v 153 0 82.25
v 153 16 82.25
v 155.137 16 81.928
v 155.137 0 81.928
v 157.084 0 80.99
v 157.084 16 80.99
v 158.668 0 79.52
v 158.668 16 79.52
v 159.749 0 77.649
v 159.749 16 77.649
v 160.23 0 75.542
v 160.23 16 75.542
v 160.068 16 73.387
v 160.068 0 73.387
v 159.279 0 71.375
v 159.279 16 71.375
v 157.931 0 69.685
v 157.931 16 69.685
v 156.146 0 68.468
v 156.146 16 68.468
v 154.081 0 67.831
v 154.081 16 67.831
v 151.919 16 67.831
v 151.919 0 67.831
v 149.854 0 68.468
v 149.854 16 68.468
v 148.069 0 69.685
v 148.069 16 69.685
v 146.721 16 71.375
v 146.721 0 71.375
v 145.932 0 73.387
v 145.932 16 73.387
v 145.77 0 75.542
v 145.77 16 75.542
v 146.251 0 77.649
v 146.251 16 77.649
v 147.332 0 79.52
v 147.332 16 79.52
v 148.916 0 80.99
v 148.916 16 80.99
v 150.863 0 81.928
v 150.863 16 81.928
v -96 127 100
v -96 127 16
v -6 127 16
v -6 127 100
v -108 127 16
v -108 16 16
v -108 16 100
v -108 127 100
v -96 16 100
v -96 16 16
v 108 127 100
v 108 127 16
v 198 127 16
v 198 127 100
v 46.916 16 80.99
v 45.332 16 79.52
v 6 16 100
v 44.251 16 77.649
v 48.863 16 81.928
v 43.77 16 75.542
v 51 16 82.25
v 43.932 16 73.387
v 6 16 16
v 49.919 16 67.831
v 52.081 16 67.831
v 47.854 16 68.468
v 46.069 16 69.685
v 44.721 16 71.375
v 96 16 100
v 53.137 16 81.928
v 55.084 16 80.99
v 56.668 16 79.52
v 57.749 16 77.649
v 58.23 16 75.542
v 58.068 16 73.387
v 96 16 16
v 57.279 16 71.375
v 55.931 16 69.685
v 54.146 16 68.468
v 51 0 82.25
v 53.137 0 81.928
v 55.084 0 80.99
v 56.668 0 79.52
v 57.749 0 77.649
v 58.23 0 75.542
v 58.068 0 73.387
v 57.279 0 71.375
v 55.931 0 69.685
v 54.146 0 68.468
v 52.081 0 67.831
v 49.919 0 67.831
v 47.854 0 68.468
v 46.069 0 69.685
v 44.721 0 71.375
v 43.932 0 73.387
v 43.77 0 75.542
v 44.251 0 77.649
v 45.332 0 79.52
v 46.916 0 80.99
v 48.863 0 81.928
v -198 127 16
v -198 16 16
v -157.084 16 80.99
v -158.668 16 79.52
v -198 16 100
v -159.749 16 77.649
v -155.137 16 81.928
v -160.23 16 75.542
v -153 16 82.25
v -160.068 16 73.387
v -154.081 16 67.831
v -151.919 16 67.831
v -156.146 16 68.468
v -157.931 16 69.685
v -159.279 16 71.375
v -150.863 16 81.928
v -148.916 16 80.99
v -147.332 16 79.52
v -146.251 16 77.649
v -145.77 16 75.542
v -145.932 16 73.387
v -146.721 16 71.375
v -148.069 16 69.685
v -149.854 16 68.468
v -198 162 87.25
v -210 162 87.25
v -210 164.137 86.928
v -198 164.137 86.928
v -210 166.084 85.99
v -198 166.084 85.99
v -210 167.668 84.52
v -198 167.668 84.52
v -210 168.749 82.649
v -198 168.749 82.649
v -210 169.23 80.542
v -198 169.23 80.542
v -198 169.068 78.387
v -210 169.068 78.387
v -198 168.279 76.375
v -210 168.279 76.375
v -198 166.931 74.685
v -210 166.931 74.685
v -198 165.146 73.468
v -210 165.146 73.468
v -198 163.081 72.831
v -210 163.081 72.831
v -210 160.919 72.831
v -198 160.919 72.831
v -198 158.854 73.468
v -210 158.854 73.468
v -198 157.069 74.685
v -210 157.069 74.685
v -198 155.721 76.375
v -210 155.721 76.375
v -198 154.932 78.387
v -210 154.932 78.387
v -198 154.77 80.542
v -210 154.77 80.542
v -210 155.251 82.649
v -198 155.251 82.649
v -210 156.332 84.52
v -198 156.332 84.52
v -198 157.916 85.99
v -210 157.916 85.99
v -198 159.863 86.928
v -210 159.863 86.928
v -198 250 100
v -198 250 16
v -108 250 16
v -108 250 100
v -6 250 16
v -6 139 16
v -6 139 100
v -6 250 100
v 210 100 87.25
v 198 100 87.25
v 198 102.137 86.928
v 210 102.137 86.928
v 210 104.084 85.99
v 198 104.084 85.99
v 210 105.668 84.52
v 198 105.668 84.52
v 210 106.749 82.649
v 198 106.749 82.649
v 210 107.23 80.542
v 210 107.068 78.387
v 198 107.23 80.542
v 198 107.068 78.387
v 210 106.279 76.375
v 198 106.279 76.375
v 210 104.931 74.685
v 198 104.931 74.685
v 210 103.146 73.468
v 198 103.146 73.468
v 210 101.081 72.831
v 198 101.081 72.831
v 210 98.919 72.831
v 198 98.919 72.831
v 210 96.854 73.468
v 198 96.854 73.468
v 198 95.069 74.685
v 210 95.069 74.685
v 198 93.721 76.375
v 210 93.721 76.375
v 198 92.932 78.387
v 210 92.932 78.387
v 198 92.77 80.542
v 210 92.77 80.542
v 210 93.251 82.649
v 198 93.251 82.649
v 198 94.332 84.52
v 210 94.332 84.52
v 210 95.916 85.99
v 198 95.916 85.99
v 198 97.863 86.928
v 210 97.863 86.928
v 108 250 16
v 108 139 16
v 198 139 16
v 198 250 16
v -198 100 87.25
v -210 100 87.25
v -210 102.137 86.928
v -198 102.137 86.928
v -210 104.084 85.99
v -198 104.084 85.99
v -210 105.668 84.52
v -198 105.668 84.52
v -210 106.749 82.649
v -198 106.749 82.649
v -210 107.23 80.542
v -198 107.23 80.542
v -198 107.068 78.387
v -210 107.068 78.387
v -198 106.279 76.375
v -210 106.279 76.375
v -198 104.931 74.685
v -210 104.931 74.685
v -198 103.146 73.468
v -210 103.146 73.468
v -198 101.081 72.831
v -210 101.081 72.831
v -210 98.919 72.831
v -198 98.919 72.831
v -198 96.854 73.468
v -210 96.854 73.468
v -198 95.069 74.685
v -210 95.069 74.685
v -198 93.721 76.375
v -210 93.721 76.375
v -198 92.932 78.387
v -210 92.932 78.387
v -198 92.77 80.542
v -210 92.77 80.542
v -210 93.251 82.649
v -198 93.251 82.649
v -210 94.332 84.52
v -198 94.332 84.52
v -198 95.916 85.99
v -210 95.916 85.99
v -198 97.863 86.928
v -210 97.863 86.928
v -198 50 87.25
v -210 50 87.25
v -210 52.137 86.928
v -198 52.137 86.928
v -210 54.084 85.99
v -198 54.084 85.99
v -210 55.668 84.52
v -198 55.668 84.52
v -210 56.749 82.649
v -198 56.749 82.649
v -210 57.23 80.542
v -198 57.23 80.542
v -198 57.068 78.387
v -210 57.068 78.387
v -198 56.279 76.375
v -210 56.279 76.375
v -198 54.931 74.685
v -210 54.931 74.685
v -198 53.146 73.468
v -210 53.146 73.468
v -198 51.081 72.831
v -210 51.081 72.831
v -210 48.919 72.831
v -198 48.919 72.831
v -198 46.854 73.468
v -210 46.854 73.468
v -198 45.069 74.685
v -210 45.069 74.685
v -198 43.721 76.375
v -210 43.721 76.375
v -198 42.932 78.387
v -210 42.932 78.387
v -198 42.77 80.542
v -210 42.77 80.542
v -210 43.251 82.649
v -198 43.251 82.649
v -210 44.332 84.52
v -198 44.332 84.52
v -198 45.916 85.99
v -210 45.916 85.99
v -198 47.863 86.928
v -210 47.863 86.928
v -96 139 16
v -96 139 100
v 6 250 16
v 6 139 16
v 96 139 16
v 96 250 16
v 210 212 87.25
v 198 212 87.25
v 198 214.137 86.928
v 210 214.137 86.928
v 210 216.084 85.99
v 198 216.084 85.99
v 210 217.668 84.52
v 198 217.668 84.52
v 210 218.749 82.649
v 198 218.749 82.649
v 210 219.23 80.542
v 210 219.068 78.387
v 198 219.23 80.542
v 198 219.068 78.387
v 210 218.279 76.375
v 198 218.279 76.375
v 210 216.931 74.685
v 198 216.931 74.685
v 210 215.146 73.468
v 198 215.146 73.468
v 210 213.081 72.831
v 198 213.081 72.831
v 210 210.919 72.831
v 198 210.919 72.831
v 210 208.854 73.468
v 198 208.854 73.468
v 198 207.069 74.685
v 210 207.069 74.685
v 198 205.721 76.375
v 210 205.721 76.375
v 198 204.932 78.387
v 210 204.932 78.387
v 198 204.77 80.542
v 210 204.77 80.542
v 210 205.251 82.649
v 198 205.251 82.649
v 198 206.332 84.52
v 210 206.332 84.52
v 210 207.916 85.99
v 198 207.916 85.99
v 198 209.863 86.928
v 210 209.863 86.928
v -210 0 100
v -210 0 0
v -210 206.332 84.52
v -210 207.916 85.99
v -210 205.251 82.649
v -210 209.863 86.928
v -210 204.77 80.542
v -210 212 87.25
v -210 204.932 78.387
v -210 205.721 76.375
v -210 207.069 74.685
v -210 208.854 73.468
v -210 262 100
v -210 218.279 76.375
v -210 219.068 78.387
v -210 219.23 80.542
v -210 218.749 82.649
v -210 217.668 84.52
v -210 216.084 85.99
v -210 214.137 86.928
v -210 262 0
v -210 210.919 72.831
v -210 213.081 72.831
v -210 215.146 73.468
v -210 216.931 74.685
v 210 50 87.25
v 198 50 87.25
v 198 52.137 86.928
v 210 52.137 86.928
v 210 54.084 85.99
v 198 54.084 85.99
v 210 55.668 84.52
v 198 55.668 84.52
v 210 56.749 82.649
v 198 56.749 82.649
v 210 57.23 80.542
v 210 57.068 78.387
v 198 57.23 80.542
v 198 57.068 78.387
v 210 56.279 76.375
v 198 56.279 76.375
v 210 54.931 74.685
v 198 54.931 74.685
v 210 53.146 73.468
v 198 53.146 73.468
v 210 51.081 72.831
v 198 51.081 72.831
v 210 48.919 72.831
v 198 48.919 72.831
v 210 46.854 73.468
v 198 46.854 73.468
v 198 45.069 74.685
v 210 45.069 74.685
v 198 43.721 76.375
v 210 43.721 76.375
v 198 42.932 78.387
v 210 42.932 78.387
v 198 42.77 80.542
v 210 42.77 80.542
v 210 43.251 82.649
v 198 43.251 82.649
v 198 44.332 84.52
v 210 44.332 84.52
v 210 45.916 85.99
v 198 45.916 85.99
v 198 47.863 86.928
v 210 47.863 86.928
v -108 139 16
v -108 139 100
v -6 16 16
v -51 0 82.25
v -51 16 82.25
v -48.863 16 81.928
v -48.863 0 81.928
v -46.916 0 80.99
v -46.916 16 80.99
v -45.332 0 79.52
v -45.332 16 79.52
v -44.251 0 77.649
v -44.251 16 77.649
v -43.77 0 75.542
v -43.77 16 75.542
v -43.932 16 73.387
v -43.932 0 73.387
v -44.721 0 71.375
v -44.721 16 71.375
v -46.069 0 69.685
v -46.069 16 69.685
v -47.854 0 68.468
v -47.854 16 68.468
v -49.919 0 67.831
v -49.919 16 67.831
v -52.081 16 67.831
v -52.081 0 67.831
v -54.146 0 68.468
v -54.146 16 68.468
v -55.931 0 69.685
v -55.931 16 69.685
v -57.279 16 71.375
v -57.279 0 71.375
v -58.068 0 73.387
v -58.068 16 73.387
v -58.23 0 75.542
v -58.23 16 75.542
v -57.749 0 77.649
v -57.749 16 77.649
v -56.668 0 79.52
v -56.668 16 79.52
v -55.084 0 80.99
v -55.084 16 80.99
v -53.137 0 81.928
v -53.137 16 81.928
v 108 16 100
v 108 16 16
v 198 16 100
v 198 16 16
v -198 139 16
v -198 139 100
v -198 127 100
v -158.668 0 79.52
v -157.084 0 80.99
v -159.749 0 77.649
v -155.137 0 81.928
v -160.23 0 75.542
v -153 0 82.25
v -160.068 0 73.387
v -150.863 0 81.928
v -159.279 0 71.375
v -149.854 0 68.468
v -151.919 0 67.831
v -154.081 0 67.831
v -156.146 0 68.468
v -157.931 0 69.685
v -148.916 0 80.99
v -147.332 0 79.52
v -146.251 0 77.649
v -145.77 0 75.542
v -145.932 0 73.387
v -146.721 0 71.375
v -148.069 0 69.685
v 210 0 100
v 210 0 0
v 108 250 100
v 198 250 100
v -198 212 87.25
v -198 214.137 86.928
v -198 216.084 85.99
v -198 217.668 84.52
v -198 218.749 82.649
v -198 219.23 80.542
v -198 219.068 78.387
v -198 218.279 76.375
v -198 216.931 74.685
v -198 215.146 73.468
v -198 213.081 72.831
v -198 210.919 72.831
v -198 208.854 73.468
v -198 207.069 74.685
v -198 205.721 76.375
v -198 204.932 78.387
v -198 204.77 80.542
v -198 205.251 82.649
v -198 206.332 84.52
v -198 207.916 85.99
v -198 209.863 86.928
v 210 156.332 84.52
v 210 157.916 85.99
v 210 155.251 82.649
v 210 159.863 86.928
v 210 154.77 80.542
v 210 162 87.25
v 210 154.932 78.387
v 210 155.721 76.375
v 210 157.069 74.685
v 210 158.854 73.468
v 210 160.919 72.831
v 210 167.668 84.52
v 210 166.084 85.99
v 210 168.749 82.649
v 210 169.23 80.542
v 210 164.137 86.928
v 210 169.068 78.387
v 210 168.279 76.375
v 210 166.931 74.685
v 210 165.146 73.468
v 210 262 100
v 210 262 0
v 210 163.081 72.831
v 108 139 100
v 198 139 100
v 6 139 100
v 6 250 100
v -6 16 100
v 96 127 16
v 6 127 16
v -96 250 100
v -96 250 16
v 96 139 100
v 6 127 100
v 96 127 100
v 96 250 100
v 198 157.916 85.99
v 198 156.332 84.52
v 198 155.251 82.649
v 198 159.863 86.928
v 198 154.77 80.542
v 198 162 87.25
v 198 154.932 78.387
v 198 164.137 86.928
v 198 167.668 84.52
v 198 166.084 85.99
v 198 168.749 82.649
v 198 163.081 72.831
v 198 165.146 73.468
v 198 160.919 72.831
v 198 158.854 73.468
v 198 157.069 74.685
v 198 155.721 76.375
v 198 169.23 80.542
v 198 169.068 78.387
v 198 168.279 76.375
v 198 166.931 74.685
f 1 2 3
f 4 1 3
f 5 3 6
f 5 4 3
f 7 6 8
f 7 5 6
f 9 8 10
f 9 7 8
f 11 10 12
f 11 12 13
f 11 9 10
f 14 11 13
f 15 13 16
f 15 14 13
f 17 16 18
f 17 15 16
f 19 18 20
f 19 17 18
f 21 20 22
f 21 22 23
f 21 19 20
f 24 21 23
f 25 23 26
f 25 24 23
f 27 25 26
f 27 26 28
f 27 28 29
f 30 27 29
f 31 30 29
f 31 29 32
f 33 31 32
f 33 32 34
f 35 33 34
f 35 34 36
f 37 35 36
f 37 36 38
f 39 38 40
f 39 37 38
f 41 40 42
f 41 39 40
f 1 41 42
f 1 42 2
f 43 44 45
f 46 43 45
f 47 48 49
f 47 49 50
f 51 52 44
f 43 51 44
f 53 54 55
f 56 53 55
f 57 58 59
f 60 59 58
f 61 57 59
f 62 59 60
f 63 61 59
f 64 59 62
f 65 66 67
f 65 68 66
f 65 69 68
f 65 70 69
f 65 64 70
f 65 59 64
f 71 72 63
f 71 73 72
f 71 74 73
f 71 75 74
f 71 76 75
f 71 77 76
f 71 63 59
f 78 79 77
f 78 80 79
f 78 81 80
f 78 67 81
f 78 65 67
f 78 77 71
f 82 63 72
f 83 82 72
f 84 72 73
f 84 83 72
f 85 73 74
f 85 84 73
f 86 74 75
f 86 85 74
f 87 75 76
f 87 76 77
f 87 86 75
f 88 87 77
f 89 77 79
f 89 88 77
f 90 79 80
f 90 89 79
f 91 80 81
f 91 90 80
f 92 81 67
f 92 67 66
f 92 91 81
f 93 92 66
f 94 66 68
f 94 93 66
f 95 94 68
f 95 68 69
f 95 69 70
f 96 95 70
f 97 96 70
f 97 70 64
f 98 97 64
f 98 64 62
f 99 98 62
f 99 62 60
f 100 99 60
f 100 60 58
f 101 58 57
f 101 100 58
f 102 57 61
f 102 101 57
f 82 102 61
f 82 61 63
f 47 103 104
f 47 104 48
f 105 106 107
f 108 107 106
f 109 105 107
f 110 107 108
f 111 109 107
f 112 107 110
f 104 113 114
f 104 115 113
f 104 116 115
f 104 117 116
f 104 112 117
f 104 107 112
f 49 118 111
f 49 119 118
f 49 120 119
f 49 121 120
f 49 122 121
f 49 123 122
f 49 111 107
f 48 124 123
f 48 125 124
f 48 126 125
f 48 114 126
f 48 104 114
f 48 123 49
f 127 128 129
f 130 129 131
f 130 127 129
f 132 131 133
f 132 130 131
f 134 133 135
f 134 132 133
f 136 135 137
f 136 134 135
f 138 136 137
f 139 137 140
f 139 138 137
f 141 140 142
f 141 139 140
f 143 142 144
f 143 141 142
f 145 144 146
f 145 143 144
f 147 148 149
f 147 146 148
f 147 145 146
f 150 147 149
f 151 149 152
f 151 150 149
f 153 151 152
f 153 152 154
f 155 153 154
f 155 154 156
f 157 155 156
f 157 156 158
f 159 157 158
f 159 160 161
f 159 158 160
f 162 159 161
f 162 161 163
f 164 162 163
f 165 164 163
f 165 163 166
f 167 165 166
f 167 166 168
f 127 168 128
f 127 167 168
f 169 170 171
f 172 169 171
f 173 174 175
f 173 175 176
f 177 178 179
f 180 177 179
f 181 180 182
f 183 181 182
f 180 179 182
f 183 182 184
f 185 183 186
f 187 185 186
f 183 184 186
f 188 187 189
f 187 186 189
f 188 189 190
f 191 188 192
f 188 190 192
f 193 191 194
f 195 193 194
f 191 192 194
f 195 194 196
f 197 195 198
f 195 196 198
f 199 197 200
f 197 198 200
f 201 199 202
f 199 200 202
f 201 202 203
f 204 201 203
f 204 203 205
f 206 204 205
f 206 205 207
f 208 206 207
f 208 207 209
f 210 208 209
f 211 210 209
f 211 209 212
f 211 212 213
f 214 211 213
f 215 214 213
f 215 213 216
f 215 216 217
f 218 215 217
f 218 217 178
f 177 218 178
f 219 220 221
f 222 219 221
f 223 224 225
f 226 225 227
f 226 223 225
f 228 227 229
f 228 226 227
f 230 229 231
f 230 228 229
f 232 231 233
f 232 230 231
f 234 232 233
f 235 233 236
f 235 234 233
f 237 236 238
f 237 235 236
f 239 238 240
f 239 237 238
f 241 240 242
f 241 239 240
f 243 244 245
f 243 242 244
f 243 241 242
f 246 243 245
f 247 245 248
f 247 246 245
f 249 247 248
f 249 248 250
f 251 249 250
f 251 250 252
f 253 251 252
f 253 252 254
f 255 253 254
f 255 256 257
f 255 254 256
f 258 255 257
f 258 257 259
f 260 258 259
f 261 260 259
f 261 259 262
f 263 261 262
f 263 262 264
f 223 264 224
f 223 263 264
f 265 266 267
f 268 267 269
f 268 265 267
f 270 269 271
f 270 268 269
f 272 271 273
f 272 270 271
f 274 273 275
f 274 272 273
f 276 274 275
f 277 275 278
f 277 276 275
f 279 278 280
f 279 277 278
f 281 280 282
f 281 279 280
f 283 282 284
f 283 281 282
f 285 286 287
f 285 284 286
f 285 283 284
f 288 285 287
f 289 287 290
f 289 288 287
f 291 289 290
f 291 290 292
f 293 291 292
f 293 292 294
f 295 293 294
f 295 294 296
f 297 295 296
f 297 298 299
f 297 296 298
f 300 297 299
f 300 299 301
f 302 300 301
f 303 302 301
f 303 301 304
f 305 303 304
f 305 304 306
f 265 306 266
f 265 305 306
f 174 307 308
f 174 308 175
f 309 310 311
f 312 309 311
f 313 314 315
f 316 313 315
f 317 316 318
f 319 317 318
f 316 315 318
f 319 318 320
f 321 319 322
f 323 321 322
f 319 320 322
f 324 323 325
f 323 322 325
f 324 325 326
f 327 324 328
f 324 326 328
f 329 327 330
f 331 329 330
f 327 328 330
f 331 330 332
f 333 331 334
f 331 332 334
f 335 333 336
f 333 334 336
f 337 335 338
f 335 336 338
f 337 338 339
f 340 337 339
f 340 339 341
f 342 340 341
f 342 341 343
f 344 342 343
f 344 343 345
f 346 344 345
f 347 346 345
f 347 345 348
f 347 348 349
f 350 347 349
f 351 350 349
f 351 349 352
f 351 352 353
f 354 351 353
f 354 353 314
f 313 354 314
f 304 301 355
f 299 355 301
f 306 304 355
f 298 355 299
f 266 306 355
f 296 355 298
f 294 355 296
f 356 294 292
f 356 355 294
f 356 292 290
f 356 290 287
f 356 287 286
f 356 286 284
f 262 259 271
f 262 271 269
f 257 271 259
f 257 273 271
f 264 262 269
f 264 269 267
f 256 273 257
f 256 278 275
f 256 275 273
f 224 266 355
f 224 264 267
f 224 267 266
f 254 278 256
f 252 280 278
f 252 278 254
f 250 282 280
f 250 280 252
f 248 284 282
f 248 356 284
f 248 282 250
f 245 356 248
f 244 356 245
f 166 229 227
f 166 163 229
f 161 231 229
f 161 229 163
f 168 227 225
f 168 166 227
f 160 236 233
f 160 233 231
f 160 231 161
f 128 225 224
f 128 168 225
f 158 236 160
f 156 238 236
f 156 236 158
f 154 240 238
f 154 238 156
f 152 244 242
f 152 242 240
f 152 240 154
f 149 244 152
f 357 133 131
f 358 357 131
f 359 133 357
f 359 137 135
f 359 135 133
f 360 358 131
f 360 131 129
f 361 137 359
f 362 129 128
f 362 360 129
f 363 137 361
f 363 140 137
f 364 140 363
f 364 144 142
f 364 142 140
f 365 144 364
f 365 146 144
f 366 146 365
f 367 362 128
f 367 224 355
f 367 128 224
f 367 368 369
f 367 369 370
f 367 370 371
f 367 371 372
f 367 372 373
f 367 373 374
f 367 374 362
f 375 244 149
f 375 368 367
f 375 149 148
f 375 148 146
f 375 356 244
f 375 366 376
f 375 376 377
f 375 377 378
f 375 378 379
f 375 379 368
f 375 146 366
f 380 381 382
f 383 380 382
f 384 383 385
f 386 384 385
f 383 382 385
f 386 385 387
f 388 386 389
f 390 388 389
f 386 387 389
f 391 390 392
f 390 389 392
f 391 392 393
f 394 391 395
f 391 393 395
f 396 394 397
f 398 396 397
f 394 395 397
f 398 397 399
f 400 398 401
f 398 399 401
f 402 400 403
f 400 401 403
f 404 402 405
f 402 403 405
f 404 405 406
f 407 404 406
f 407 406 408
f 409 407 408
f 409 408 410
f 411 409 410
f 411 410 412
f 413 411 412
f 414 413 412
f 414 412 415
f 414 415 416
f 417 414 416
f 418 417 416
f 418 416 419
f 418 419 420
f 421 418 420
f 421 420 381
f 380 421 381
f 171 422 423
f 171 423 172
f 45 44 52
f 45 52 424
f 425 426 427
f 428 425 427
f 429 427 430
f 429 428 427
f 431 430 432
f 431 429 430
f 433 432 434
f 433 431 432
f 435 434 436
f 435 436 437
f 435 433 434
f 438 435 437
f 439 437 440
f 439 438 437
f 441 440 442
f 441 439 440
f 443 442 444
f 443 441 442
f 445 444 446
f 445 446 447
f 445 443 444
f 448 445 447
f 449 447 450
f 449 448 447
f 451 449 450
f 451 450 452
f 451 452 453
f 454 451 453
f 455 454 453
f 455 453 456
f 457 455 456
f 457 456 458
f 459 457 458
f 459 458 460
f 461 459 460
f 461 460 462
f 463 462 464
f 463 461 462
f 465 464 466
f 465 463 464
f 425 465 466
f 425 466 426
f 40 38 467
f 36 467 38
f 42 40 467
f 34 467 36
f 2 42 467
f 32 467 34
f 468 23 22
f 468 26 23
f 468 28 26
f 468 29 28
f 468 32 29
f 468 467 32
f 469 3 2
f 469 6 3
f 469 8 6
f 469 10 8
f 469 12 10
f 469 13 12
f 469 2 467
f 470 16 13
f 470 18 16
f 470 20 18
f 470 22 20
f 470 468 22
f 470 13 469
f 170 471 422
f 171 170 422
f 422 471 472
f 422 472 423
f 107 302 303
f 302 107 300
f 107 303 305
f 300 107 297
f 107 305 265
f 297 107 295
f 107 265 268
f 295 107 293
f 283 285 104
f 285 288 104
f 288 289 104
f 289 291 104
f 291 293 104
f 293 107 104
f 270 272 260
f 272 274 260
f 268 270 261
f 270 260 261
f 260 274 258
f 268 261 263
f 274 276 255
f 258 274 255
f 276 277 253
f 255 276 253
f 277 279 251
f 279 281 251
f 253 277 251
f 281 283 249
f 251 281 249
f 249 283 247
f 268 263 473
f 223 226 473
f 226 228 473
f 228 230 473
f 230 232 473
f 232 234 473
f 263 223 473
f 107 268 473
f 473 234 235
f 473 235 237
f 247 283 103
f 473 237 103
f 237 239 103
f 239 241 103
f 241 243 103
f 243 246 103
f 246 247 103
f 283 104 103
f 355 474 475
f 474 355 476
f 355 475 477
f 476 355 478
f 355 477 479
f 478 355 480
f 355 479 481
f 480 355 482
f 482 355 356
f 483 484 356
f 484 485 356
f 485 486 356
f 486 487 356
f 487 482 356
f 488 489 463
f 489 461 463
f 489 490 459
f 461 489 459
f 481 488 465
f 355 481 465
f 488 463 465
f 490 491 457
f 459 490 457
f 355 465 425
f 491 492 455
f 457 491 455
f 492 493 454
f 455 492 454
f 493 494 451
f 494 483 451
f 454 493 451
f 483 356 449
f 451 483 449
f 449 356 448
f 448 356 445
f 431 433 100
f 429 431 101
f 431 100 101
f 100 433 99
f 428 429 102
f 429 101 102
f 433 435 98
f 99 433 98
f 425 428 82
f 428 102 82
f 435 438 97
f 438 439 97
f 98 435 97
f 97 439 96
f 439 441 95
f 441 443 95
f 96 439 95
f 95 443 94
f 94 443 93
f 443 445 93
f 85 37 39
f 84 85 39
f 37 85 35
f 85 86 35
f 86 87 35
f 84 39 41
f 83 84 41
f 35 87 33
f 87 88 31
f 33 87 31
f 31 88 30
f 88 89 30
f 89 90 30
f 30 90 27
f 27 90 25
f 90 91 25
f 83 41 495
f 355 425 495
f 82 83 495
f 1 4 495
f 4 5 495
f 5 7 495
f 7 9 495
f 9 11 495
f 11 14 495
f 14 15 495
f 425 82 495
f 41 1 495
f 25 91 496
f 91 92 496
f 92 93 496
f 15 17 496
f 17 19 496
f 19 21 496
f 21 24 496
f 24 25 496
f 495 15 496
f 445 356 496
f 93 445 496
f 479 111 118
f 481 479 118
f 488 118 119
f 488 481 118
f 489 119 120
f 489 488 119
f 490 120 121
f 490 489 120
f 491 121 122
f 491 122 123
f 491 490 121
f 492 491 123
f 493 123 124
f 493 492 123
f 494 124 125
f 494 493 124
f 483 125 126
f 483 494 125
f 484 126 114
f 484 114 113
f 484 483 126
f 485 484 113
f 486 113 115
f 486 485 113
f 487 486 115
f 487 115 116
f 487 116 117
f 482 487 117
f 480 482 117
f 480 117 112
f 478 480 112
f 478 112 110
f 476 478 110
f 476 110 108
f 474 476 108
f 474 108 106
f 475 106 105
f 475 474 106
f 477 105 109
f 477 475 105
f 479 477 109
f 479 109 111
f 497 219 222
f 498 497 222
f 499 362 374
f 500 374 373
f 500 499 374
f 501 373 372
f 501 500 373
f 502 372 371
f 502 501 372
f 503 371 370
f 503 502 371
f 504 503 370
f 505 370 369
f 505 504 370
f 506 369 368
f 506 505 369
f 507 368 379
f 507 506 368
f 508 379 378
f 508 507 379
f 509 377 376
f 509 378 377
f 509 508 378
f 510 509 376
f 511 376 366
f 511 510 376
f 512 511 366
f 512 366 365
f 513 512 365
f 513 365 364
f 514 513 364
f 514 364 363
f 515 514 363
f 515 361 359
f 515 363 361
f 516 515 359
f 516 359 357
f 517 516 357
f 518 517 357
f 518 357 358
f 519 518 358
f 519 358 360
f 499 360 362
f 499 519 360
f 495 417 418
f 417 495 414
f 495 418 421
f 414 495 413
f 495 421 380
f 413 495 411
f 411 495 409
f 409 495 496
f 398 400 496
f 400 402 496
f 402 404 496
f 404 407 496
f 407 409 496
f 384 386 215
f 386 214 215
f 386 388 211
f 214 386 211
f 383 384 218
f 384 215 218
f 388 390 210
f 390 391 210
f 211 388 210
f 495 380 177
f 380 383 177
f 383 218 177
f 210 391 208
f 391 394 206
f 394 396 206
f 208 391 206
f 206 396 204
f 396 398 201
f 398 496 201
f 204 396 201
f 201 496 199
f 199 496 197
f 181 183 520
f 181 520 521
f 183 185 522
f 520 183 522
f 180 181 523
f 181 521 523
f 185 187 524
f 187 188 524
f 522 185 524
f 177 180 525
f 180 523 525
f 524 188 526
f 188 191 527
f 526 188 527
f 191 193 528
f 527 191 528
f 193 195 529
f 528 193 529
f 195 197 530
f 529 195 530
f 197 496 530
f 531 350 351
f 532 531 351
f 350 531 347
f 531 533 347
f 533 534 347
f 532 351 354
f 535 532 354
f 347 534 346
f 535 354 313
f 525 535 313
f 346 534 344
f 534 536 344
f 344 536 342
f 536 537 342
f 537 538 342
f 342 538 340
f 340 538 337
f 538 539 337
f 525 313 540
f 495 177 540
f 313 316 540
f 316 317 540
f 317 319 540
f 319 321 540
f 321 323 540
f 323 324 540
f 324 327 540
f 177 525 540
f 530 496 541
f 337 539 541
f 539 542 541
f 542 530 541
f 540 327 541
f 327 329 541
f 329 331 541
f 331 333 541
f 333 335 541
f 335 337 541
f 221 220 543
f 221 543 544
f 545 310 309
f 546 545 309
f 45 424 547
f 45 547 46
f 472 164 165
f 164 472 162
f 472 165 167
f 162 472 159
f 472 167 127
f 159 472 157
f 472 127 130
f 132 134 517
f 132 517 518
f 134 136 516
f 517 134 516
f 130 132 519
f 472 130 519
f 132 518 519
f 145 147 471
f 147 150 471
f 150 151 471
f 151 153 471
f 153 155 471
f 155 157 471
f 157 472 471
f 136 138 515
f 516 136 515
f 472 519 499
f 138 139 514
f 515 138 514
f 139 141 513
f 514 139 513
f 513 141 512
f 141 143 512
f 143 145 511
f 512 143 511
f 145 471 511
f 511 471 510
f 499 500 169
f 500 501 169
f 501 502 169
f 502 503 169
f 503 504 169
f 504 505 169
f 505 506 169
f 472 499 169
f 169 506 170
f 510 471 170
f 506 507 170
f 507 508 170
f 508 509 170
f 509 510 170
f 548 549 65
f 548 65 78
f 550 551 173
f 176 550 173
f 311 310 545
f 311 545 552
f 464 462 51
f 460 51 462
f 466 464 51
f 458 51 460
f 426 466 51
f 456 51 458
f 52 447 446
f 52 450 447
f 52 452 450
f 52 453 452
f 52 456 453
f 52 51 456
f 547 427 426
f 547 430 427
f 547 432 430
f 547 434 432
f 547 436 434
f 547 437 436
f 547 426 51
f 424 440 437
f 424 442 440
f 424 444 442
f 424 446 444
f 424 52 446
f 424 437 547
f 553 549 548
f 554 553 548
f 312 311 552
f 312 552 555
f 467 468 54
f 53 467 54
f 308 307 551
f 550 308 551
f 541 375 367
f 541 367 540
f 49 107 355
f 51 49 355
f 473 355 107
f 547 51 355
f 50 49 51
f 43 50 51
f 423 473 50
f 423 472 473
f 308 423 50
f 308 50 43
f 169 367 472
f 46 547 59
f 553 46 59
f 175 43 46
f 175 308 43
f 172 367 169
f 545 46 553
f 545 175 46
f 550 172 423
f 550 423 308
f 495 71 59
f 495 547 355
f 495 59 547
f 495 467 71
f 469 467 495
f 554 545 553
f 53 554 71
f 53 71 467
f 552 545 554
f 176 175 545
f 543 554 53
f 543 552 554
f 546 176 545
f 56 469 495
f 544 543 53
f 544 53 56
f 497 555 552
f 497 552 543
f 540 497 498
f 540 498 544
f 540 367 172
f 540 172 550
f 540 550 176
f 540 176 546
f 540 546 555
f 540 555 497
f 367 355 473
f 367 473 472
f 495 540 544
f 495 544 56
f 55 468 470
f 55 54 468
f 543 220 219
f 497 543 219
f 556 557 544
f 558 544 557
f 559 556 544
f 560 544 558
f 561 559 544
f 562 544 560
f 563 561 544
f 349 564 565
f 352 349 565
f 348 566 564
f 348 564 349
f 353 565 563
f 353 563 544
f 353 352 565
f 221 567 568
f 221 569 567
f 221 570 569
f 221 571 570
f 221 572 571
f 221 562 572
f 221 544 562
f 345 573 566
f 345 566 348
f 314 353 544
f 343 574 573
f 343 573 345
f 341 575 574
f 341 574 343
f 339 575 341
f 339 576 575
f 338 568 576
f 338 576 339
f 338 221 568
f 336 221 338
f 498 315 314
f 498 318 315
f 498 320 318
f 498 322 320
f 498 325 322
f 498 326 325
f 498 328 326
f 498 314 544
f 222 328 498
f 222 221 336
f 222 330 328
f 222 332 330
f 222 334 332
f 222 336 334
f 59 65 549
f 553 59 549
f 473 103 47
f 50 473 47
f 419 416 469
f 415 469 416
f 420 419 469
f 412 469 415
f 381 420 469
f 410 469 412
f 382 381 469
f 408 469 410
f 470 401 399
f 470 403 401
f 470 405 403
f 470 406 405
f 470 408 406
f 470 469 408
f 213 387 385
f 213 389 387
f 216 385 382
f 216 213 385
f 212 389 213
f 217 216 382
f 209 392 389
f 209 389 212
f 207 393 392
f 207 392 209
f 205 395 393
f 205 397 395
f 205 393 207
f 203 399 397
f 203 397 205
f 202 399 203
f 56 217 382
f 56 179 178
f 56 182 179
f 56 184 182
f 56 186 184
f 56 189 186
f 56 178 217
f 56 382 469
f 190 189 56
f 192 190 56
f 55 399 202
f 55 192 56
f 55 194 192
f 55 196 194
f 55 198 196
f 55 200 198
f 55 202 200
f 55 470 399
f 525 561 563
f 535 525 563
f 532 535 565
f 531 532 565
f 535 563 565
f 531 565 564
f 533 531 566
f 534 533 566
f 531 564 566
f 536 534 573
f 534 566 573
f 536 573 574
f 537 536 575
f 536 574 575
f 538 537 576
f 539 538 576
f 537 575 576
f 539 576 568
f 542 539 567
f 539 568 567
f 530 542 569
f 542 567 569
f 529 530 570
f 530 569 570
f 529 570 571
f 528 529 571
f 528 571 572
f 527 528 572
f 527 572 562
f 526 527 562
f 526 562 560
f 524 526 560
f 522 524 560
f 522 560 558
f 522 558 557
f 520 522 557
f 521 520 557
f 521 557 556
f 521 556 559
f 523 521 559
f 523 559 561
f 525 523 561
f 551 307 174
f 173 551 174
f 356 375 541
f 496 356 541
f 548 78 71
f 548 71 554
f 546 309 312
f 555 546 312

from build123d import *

# Parameters (mm, degrees)
SKETCH1_W           = 420
SKETCH1_H           = 100
BOSS_EXTRUDE1_DEPTH = 16
SKETCH2_W           = 420
SKETCH2_H           = 246
BOSS_EXTRUDE2_DEPTH = 16
SKETCH3_W           = 420
SKETCH3_H           = 12
SKETCH3_W_2         = 12
SKETCH3_H_2         = 111
SKETCH3_H_3         = 111.25908774
BOSS_EXTRUDE3_DEPTH = 100
SKETCH4_R           = 7.25
CUT_EXTRUDE3_DEPTH  = 16
SKETCH5_R           = 7.25
CUT_EXTRUDE4_DEPTH  = 26


with BuildPart() as part:
    # Sketch1 → Boss-Extrude1 (new body)
    with BuildSketch(Plane(origin=(0, 0, 0), x_dir=(1, 0, 0), z_dir=(0, 1, 0))):
        with Locations((0, -50)):
            Rectangle(SKETCH1_W, SKETCH1_H)
    extrude(amount=BOSS_EXTRUDE1_DEPTH)

    # Sketch2 → Boss-Extrude2 (add)
    with BuildSketch(Plane.XY):
        with Locations((0, 139)):
            Rectangle(SKETCH2_W, SKETCH2_H)
    extrude(amount=BOSS_EXTRUDE2_DEPTH)

    # Sketch3 → Boss-Extrude3 (add)
    with BuildSketch(Plane.XY):
        with Locations((0, 256)):
            Rectangle(SKETCH3_W, SKETCH3_H)
        with Locations((-204, 194.5)):
            Rectangle(SKETCH3_W_2, SKETCH3_H_2)
        with Locations((-102, 194.5)):
            Rectangle(SKETCH3_W_2, SKETCH3_H_2)
        with Locations((0, 194.5)):
            Rectangle(SKETCH3_W_2, SKETCH3_H_2)
        with Locations((0, 133)):
            Rectangle(SKETCH3_W, SKETCH3_H)
        with Locations((-204, 71.5)):
            Rectangle(SKETCH3_W_2, SKETCH3_H_2)
        with Locations((-102, 71.37045613)):
            Rectangle(SKETCH3_W_2, SKETCH3_H_3)
        with Locations((204, 71.5)):
            Rectangle(SKETCH3_W_2, SKETCH3_H_2)
        with Locations((204, 194.5)):
            Rectangle(SKETCH3_W_2, SKETCH3_H_2)
        with Locations((0, 71.5)):
            Rectangle(SKETCH3_W_2, SKETCH3_H_2)
        with Locations((102, 194.5)):
            Rectangle(SKETCH3_W_2, SKETCH3_H_2)
        with Locations((102, 71.5)):
            Rectangle(SKETCH3_W_2, SKETCH3_H_2)
    extrude(amount=BOSS_EXTRUDE3_DEPTH)

    # Sketch4 → Cut-Extrude3 (cut)
    with BuildSketch(Plane(origin=(0, 0, 0), x_dir=(1, 0, 0), z_dir=(0, 1, 0))):
        with Locations(Location((-153, -75, 0), (0, 0, 270))):
            Circle(SKETCH4_R)
        with Locations(Location((-51, -75, 0), (0, 0, 270))):
            Circle(SKETCH4_R)
        with Locations(Location((51, -75, 0), (0, 0, 270))):
            Circle(SKETCH4_R)
        with Locations(Location((153, -75, 0), (0, 0, 270))):
            Circle(SKETCH4_R)
    extrude(amount=CUT_EXTRUDE3_DEPTH, mode=Mode.SUBTRACT)

    # Sketch5 → Cut-Extrude4 (cut)
    with BuildSketch(Plane.ZY.offset(-198)):
        with Locations((80, 212)):
            Circle(SKETCH5_R)
        with Locations((80, 162)):
            Circle(SKETCH5_R)
        with Locations((80, 100)):
            Circle(SKETCH5_R)
        with Locations((80, 50)):
            Circle(SKETCH5_R)
    cut_extrude4 = extrude(amount=-CUT_EXTRUDE4_DEPTH, mode=Mode.SUBTRACT)

    # Mirror1: Cut-Extrude4 across plane
    add(cut_extrude4.mirror(Plane(origin=(0, 0, 0), x_dir=(0, 0, 1), z_dir=(1, 0, 0))), mode=Mode.SUBTRACT)


solid = part.part
